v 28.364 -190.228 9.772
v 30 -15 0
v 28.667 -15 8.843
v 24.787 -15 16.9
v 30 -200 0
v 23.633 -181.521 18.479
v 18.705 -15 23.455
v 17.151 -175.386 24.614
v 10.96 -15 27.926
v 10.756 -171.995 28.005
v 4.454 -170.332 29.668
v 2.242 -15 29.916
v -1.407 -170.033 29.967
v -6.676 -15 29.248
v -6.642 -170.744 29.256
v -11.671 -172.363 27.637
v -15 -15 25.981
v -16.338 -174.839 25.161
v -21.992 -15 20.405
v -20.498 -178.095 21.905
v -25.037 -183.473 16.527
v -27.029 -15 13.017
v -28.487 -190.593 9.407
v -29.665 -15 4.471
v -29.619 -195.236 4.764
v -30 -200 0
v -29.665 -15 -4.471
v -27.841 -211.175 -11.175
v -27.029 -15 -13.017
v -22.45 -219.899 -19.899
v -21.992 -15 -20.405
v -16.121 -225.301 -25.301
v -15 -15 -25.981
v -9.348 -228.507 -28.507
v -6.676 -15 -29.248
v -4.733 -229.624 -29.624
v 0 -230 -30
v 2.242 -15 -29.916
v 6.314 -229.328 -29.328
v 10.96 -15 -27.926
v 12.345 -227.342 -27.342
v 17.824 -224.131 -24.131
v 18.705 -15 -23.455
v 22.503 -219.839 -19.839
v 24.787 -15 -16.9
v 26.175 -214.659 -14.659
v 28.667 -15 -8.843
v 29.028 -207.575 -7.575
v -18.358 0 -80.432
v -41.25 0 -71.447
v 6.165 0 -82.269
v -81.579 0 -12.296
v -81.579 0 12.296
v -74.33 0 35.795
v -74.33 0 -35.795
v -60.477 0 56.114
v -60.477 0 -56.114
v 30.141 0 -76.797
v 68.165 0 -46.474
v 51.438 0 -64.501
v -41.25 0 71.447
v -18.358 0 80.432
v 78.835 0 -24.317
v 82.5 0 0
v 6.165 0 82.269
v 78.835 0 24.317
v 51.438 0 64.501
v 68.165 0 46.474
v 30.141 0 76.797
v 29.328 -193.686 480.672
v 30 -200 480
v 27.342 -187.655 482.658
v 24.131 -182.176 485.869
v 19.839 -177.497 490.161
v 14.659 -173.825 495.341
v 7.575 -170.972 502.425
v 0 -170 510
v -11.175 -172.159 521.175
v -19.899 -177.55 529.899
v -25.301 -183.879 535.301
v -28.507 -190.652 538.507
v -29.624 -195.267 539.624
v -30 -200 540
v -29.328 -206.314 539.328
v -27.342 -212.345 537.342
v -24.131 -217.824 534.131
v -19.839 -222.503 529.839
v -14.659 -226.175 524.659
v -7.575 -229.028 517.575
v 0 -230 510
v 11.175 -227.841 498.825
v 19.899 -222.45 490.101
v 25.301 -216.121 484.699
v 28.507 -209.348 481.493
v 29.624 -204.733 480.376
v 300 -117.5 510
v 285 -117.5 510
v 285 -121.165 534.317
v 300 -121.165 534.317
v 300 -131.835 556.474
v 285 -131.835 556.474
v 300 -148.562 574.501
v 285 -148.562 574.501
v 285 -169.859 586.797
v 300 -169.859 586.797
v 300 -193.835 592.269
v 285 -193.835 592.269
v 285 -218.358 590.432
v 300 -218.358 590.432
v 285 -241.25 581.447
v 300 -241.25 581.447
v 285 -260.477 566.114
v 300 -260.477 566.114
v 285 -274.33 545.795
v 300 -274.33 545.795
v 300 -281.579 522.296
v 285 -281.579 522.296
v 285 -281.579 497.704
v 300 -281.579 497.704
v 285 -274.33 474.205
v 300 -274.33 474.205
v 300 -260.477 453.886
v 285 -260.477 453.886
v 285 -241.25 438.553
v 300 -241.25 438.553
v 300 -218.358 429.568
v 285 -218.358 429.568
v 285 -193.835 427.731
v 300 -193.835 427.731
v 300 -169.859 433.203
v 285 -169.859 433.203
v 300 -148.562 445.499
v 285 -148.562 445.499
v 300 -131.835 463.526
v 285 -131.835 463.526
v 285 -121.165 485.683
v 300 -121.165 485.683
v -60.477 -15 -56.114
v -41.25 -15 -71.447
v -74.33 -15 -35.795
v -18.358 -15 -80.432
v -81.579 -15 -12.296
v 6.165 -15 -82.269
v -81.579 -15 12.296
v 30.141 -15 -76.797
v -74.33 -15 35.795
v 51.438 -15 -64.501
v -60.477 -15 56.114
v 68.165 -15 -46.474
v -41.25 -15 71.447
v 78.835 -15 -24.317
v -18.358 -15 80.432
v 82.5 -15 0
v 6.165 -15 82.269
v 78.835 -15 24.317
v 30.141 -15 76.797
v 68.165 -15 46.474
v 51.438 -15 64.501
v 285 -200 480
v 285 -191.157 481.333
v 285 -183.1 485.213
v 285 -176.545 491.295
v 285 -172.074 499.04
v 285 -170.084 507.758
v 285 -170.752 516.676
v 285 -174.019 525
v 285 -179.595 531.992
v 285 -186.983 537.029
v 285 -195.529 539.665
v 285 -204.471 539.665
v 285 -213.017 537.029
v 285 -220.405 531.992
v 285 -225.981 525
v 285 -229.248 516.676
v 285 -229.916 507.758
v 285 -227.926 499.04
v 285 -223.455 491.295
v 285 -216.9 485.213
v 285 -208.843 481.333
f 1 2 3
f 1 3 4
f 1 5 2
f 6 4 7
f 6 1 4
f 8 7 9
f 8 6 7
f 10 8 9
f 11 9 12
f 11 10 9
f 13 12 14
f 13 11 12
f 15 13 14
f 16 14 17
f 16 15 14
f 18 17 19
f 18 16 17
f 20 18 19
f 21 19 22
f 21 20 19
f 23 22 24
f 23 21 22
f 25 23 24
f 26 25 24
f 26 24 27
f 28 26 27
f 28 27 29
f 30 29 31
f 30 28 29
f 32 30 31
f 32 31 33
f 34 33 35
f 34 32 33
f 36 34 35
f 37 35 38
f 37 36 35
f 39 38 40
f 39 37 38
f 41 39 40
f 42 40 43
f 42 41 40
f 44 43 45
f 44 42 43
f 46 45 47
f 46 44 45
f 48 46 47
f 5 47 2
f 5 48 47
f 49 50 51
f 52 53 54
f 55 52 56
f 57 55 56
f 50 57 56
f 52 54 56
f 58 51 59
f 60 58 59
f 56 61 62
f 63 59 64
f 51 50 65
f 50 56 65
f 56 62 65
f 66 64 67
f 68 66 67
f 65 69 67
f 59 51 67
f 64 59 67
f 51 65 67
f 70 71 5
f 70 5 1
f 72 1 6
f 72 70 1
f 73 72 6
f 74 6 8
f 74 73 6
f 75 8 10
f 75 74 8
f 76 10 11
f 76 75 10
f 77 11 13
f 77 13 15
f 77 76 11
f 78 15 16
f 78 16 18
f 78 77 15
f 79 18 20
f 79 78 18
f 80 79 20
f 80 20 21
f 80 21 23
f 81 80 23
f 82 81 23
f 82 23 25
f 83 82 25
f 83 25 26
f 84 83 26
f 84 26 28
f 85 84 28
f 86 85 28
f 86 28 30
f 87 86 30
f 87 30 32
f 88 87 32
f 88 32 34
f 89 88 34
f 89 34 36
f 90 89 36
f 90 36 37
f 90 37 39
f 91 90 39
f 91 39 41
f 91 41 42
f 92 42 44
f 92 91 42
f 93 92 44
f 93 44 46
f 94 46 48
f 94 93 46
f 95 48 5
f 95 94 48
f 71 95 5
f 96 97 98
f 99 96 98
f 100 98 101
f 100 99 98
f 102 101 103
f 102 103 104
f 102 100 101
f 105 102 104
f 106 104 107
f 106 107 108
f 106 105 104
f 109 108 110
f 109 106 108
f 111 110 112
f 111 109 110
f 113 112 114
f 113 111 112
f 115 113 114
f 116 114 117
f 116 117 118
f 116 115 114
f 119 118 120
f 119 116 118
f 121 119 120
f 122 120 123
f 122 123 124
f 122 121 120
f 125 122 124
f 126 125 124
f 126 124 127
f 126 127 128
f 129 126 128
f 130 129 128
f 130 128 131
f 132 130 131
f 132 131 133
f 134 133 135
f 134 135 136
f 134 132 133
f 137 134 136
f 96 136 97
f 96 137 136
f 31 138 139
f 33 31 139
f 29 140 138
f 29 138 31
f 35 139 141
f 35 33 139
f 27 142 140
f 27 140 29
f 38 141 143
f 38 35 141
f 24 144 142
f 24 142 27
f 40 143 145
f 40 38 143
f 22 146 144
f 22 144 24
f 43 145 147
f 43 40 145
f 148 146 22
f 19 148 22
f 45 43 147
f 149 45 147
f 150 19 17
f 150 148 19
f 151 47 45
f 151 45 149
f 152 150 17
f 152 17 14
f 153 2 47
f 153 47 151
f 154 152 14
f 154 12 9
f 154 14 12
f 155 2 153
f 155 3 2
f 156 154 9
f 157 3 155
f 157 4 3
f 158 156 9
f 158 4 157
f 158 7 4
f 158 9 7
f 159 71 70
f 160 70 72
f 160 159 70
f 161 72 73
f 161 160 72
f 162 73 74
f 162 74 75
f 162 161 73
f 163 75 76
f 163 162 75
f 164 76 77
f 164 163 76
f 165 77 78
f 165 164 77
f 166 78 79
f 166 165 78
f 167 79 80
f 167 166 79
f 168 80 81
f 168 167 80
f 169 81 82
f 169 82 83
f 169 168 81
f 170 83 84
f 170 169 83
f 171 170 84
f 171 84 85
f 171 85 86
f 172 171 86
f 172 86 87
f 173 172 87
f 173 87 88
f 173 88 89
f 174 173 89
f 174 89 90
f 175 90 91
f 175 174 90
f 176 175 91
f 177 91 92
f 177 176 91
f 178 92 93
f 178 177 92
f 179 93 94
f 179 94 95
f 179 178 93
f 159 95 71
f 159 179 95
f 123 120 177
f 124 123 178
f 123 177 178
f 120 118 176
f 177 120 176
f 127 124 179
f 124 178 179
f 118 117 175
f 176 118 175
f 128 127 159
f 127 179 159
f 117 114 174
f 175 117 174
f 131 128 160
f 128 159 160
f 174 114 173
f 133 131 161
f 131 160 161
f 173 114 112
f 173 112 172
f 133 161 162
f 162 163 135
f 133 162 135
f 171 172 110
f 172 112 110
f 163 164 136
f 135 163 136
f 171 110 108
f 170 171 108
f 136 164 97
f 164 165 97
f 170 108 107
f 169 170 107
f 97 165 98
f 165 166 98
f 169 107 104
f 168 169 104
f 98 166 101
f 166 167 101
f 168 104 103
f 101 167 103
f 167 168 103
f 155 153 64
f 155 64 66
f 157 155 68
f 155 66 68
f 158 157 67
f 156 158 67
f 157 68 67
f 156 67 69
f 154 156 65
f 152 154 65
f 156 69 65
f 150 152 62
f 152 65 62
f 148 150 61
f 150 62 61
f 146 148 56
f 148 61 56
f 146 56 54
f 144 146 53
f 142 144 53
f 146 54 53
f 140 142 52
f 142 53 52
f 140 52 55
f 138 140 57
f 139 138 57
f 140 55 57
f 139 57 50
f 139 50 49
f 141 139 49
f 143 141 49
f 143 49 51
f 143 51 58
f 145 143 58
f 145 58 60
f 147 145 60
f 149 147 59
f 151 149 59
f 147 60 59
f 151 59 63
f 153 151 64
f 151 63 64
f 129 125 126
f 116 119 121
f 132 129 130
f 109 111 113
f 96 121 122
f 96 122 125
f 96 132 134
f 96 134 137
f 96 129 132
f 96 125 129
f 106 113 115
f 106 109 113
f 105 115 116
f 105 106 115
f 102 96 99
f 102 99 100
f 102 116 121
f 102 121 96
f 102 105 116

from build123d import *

# Parameters (mm, degrees)
F0_R     = 30
F0_R_2   = 82.5
F5_DEPTH = 15
F6_R     = 82.5
F6_R_2   = 30
F7_DEPTH = 15


with BuildPart() as f4:
    # F4: sweep along a path in F1, F3
    with BuildLine(Plane.YZ) as f4_path:
        Line((0, 0), (-200, 0))
        Line((-200, 0), (-200, 510))
    with BuildLine(Plane.XZ.offset(200)) as f4_path_2:
        Line((0, 510), (300, 510))
    # F0 (on Front) → F4 (sweep)
    with BuildSketch(Plane.XZ):
        Circle(F0_R)
    sweep(path=f4_path.line + f4_path_2.line, transition=Transition.RIGHT)

    # F0 (on Front) → F5 (join)
    with BuildSketch(Plane.XZ):
        Circle(F0_R_2)
        Circle(F0_R, mode=Mode.SUBTRACT)
    extrude(amount=F5_DEPTH)

    # F6 (on face) → F7 (join)
    with BuildSketch(Plane.YZ.offset(300)):
        with Locations((-200, 510)):
            Circle(F6_R)
        with Locations((-200, 510)):
            Circle(F6_R_2, mode=Mode.SUBTRACT)
    extrude(amount=-F7_DEPTH)


solid = f4.part
